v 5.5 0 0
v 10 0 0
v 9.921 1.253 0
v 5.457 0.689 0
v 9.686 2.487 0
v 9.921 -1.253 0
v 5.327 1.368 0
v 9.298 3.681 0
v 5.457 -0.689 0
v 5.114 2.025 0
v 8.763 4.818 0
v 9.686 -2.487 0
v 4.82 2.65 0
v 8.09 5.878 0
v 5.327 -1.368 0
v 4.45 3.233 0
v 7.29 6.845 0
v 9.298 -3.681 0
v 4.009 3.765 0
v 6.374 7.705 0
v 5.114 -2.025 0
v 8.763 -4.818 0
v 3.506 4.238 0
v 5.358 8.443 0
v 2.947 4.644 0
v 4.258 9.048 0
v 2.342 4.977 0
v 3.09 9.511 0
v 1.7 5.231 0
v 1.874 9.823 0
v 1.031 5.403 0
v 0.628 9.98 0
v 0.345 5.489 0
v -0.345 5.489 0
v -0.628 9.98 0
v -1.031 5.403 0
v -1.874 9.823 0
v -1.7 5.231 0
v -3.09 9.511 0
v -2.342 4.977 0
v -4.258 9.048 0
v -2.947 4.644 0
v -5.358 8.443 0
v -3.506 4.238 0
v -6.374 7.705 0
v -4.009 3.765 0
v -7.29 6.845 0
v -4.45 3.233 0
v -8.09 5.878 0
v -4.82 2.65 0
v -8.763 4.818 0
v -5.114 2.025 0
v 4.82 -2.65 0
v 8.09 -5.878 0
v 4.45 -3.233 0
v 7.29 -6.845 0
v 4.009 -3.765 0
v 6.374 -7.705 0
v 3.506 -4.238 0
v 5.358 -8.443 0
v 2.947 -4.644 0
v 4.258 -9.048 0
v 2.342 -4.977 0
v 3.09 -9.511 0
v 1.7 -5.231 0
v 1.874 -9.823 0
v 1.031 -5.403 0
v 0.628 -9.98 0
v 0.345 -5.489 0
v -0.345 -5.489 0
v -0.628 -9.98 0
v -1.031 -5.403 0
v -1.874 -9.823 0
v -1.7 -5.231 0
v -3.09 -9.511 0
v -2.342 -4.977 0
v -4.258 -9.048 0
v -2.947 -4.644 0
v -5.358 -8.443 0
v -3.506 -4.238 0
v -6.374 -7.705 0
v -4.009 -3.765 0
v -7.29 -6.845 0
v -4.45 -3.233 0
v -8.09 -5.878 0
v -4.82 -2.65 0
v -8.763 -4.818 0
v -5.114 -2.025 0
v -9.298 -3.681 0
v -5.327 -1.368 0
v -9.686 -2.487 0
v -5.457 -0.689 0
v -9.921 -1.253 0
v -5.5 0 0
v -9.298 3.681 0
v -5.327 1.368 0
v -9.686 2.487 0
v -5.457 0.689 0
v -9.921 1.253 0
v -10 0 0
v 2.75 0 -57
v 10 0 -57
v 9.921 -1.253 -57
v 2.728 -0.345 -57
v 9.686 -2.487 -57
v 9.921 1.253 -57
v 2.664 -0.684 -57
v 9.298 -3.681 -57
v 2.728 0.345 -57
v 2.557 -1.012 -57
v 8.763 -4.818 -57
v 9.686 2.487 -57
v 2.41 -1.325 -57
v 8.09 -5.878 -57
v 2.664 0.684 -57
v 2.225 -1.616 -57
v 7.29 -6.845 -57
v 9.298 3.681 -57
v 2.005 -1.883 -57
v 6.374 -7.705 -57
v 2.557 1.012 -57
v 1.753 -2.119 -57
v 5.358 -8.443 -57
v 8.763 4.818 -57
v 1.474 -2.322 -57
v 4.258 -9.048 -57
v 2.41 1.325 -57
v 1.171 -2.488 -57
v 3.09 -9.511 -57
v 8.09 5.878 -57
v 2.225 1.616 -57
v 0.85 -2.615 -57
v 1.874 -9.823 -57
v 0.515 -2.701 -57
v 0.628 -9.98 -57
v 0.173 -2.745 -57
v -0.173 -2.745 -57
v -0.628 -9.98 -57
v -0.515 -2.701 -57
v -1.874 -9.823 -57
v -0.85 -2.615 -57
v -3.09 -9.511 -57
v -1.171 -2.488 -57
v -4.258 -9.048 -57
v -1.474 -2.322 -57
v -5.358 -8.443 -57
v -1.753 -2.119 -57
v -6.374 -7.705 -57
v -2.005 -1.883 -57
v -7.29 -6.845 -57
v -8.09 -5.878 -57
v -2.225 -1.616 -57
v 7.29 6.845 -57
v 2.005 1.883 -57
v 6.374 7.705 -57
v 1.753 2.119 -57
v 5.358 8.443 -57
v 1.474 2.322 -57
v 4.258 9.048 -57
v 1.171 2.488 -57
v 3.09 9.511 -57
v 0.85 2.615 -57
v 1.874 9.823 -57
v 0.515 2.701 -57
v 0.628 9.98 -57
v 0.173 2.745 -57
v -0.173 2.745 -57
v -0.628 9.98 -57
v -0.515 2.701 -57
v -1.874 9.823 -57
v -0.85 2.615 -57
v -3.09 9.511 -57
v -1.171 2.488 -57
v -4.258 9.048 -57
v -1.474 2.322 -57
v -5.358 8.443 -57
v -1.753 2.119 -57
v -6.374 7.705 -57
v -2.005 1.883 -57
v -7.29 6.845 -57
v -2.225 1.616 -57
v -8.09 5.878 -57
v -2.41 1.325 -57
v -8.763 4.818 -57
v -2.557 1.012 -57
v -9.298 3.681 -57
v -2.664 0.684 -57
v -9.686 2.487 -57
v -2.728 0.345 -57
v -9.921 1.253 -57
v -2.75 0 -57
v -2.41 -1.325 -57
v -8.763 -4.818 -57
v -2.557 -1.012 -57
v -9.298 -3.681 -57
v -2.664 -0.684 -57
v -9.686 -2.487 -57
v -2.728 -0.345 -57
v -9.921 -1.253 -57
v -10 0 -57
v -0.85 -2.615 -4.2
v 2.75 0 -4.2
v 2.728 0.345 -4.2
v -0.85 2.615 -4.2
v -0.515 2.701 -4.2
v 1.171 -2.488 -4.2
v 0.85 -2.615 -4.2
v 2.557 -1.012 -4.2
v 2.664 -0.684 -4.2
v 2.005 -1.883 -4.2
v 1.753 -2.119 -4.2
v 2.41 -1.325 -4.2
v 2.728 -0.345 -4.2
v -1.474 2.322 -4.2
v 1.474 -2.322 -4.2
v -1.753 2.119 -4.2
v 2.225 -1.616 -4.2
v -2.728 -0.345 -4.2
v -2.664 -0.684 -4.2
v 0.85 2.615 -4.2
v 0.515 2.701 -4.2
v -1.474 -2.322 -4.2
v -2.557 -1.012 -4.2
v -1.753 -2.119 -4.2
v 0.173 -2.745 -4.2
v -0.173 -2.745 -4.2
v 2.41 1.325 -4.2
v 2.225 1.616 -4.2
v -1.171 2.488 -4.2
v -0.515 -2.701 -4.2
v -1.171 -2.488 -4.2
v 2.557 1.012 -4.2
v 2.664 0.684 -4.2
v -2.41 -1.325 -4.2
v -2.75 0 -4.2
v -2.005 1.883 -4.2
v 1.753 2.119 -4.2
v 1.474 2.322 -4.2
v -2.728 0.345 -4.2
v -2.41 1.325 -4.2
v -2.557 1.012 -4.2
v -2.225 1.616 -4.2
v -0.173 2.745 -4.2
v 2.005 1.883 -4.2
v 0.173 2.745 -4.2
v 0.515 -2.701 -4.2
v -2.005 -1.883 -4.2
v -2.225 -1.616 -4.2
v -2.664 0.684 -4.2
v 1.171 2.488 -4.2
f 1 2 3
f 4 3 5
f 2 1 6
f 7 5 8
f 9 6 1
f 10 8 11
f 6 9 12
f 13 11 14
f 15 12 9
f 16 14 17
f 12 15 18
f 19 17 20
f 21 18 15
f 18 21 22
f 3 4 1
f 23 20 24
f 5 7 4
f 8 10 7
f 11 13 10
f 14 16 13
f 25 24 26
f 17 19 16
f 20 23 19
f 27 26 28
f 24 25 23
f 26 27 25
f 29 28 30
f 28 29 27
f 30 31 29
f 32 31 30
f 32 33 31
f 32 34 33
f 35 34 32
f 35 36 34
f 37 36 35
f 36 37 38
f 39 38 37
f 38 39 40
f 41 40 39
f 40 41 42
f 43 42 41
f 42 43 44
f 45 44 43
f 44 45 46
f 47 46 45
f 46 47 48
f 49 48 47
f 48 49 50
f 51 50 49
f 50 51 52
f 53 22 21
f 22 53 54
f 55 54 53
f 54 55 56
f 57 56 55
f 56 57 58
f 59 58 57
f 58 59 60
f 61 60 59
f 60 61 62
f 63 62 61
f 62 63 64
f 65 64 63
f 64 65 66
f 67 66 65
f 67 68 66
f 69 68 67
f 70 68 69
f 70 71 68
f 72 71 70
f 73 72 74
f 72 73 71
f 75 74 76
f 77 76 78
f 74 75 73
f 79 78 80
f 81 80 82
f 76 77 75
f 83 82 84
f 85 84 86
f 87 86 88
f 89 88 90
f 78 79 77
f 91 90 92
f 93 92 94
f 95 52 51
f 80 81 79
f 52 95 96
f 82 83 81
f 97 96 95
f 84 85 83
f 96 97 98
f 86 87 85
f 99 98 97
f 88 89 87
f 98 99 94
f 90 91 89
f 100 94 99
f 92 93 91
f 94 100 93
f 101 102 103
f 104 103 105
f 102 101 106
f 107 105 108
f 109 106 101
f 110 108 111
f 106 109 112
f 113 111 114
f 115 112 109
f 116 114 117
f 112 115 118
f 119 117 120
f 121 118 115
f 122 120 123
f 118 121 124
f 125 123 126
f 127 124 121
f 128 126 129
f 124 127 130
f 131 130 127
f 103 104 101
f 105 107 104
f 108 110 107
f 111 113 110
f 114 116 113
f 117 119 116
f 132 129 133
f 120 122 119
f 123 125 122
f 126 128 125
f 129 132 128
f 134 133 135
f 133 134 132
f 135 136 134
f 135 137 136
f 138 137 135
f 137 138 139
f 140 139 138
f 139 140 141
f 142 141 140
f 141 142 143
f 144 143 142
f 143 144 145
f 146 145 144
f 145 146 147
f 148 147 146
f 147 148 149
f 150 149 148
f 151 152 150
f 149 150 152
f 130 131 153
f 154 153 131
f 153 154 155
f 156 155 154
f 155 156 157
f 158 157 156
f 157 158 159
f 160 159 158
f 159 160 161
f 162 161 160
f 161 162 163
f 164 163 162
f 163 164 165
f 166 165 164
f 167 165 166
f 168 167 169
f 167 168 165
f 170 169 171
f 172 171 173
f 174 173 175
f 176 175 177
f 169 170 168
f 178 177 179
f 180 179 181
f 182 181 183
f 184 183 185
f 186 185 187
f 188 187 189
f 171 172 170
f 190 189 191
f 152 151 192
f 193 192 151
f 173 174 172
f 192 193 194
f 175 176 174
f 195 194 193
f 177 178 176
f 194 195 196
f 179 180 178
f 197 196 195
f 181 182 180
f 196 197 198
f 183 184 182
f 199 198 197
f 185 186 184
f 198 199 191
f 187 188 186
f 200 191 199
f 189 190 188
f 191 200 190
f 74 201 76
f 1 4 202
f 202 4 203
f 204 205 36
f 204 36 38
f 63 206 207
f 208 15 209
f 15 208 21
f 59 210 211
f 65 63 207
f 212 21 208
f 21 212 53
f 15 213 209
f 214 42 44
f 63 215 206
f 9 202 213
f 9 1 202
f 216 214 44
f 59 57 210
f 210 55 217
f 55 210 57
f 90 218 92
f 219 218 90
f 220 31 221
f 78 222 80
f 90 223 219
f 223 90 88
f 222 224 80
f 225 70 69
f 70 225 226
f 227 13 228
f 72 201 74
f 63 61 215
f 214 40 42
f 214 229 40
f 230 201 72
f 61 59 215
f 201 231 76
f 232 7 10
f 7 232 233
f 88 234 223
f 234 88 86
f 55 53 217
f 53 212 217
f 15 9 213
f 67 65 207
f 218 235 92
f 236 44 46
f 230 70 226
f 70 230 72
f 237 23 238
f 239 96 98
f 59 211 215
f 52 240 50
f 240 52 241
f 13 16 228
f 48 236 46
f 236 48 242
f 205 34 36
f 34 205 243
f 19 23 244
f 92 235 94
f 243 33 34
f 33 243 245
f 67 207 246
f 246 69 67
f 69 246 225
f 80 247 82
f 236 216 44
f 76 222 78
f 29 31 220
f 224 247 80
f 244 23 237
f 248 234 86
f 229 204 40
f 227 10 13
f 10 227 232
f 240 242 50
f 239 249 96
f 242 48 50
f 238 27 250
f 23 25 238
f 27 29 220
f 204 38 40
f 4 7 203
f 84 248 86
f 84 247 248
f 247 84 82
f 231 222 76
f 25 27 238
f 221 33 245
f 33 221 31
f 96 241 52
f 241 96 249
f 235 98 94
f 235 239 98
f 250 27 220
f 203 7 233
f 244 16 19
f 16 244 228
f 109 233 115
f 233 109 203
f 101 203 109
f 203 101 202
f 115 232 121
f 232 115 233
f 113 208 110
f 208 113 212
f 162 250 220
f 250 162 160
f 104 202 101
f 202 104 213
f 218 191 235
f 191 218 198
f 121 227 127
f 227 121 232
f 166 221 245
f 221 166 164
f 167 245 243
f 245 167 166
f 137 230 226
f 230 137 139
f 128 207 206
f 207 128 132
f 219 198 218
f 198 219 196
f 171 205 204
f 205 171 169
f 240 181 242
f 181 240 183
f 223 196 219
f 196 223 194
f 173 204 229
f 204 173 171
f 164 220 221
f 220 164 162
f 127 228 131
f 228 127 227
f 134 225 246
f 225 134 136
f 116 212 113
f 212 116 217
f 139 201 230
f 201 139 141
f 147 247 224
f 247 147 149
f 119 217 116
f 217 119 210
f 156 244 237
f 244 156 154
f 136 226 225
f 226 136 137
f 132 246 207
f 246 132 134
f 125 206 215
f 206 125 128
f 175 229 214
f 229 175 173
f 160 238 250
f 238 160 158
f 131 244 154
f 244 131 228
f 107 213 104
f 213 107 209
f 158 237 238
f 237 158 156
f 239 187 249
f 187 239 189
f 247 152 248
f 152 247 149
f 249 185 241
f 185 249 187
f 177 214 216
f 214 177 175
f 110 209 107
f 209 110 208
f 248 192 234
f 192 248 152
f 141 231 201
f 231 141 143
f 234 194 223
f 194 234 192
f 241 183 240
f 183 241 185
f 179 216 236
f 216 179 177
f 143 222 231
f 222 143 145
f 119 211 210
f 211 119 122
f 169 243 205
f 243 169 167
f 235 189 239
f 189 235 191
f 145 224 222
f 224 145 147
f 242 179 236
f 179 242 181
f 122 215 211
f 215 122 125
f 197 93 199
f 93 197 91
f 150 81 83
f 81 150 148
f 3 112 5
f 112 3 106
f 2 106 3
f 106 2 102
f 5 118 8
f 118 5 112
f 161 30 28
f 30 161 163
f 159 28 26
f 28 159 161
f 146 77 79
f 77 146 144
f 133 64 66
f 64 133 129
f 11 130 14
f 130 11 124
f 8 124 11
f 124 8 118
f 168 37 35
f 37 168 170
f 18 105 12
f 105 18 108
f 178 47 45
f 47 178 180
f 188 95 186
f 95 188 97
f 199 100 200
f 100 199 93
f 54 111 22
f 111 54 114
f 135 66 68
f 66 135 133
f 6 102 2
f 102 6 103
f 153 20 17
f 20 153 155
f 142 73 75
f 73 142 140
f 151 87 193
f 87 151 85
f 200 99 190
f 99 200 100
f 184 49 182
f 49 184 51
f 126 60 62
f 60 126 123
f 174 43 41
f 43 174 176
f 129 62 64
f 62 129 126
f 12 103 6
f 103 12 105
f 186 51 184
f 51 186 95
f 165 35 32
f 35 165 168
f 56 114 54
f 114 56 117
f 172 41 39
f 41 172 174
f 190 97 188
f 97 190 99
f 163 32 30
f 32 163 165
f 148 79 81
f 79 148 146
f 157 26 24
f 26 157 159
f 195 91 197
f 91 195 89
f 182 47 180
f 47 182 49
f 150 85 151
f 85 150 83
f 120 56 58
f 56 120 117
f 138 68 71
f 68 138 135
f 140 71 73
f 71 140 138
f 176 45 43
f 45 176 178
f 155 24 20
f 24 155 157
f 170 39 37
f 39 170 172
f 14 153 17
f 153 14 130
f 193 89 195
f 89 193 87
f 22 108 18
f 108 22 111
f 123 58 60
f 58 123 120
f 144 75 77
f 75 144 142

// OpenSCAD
$fn = 50;


difference() {
	union() {
		translate(v = [0, 0, -57.0000000000]) {
			cylinder(h = 57, r = 10.0000000000);
		}
		cylinder(h = 0, r = 20.0000000000);
	}
	union() {
		translate(v = [0, 0, 0]) {
			rotate(a = [0, 0, 0]) {
				difference() {
					union() {
						#translate(v = [0, 0, -57.0000000000]) {
							cylinder(h = 57, r = 2.2500000000);
						}
						#translate(v = [0, 0, -4.2000000000]) {
							cylinder(h = 4.2000000000, r1 = 2.7500000000, r2 = 5.5000000000);
						}
						#translate(v = [0, 0, -57.0000000000]) {
							cylinder(h = 57, r = 2.7500000000);
						}
						#translate(v = [0, 0, -57.0000000000]) {
							cylinder(h = 57, r = 2.2500000000);
						}
					}
					union();
				}
			}
		}
	}
}
